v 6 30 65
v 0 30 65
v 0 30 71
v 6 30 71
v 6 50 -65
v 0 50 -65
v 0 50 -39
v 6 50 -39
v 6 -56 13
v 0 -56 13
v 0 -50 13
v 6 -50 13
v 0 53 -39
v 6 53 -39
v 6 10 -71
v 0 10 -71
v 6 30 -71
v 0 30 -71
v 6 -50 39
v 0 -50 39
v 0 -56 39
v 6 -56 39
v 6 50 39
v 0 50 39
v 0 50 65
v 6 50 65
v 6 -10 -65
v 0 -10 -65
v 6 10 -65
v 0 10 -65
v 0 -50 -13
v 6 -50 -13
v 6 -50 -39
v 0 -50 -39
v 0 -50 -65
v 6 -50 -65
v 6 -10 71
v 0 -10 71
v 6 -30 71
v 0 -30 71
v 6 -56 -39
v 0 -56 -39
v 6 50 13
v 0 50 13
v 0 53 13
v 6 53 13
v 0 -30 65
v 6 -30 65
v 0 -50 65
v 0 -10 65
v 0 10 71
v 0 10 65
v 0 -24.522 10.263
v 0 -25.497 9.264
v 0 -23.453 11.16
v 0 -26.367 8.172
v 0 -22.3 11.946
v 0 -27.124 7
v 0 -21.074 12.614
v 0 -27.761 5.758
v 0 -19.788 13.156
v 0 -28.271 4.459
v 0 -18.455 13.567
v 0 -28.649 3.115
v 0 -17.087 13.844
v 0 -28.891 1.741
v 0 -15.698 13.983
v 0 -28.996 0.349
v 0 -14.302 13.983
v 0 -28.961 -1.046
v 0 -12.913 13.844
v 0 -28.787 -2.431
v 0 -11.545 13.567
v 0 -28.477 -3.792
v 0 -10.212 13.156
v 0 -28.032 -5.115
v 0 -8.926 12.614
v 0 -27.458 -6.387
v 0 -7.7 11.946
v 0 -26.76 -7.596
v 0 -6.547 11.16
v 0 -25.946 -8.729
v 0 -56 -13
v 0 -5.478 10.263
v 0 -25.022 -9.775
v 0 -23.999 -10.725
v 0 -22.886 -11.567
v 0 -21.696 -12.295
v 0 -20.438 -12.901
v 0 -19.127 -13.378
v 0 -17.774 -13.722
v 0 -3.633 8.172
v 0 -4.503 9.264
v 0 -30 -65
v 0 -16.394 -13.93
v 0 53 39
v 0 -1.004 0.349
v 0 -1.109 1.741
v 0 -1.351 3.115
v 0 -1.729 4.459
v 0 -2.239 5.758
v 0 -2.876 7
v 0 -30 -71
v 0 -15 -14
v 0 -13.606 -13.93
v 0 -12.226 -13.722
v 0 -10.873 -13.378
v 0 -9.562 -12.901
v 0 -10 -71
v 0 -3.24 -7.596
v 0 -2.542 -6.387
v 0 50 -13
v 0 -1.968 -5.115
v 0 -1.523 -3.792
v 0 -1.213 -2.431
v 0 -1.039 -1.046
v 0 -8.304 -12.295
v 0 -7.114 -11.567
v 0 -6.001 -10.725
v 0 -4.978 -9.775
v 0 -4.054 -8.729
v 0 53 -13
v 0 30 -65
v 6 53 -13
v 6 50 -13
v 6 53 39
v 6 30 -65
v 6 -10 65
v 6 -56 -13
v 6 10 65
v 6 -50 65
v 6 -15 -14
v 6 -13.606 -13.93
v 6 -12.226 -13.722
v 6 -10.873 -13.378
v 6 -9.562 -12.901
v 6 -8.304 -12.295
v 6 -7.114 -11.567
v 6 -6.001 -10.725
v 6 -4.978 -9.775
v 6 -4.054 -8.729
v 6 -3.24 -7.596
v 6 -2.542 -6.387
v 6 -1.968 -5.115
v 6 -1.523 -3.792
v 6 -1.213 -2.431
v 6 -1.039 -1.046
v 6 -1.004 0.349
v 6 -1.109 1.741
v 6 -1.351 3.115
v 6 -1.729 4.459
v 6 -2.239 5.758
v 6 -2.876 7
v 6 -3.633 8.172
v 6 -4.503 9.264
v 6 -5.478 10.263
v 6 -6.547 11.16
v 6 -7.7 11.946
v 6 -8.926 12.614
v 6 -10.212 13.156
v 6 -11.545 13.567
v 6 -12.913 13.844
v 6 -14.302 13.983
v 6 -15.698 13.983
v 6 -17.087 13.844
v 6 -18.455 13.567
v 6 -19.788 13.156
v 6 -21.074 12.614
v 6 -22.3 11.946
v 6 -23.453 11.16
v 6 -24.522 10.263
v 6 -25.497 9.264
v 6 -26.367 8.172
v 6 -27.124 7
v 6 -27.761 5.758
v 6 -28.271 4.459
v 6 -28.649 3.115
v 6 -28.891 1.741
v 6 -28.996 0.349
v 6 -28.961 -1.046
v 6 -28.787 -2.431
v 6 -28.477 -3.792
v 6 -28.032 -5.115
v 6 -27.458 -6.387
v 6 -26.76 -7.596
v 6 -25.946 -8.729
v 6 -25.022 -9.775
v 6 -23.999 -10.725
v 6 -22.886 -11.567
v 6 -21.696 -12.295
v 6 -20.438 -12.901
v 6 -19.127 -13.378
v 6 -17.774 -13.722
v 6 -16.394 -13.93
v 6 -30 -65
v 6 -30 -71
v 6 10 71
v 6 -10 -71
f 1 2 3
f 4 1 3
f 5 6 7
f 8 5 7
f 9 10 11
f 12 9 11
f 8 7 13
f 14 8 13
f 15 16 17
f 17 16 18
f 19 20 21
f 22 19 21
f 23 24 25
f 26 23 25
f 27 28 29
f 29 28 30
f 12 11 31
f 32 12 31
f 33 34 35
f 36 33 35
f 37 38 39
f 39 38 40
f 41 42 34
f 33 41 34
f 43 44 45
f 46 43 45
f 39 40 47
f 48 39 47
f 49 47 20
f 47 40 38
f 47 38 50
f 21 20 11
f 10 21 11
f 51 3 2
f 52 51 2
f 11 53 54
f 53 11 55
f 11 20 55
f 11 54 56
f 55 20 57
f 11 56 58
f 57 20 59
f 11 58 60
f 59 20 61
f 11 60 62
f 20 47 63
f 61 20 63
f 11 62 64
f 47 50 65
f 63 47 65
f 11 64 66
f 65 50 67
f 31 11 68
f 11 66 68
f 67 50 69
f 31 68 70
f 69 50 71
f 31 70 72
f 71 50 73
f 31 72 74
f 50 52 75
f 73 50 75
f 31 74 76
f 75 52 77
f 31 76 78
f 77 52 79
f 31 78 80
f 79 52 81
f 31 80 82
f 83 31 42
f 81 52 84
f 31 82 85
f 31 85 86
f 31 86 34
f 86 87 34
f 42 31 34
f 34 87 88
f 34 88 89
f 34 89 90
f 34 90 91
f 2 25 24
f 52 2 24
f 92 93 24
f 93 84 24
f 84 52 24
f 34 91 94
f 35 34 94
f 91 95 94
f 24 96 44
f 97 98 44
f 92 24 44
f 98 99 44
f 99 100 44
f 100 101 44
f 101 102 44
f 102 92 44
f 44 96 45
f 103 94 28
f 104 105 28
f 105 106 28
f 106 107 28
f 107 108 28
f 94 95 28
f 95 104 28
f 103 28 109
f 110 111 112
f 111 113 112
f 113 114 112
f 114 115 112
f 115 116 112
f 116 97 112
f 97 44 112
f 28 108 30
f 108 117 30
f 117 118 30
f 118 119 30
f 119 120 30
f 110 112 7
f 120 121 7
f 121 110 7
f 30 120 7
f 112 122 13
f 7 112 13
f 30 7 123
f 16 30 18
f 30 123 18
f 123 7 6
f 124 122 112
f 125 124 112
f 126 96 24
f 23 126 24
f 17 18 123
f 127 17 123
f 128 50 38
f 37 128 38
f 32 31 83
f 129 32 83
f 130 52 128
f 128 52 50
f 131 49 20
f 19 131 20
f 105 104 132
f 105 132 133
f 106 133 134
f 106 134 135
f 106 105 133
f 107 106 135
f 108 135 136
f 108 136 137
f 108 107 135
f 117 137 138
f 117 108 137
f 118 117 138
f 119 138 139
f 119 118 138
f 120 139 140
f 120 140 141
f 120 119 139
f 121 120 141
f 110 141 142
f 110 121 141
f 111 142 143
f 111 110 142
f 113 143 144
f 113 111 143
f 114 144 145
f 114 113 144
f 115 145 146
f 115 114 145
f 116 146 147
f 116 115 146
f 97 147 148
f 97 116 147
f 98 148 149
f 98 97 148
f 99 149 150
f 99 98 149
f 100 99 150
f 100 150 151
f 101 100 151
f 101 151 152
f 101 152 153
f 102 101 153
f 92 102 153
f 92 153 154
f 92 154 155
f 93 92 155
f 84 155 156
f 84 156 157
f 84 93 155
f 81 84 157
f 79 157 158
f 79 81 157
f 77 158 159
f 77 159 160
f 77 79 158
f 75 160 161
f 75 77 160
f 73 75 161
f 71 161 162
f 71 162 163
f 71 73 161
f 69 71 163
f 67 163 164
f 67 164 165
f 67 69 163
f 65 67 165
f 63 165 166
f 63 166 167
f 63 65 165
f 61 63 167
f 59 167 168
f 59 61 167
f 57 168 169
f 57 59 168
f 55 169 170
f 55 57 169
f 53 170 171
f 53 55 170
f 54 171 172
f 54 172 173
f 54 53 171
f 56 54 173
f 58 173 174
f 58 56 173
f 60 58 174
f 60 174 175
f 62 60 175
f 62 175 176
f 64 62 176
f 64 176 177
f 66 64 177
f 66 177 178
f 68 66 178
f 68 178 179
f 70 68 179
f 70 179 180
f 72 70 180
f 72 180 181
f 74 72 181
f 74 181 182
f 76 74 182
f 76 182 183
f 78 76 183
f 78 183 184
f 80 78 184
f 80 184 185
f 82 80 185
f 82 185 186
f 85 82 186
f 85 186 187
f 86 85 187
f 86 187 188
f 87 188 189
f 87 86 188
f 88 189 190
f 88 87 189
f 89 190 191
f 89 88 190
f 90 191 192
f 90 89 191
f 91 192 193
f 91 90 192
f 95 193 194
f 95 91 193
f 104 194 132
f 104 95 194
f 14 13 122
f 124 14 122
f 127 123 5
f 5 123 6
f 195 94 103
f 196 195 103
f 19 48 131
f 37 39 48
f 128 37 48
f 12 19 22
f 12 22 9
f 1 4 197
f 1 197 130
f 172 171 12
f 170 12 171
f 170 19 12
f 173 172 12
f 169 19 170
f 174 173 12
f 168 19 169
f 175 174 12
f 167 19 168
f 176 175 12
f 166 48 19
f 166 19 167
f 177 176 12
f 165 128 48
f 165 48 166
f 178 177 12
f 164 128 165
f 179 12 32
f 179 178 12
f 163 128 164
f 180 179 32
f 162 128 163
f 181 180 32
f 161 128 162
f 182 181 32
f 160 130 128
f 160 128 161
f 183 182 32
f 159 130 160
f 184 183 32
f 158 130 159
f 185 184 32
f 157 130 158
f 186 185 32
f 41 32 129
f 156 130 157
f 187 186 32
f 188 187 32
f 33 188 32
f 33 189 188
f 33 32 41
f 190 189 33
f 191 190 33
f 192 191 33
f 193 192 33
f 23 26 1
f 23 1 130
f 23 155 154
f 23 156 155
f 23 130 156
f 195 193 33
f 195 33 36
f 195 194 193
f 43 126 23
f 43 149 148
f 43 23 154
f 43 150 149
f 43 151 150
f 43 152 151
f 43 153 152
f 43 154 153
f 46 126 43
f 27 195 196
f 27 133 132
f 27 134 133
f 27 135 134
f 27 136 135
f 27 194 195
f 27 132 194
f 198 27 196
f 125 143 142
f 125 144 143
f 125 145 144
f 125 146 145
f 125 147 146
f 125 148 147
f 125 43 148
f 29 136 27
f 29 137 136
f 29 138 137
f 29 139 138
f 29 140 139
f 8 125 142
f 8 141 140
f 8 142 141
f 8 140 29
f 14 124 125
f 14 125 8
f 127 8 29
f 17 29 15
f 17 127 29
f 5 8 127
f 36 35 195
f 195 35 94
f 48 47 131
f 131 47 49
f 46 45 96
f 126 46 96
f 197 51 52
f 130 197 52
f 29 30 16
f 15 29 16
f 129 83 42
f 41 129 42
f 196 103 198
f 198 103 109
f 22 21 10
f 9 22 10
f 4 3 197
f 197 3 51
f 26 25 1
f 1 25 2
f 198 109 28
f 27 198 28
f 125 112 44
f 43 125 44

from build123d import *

# Parameters (mm, degrees)
SKETCH1_R           = 14
BOSS_EXTRUDE1_DEPTH = 6


with BuildPart() as part:
    # Sketch1 → Boss-Extrude1 (new body)
    with BuildSketch(Plane(origin=(0, 0, 0), x_dir=(0, 0, -1), z_dir=(1, 0, 0))):
        Polygon((65, -30), (71, -30), (71, -10), (65, -10), (65, 10), (71, 10), (71, 30), (65, 30), (65, 50), (39, 50), (39, 53), (13, 53), (13, 50), (-13, 50), (-13, 53), (-39, 53), (-39, 50), (-65, 50), (-65, 30), (-71, 30), (-71, 10), (-65, 10), (-65, -10), (-71, -10), (-71, -30), (-65, -30), (-65, -50), (-39, -50), (-39, -56), (-13, -56), (-13, -50), (13, -50), (13, -56), (39, -56), (39, -50), (65, -50), align=None)
        with Locations((0, -15)):
            Circle(SKETCH1_R, mode=Mode.SUBTRACT)
    extrude(amount=BOSS_EXTRUDE1_DEPTH)


solid = part.part
